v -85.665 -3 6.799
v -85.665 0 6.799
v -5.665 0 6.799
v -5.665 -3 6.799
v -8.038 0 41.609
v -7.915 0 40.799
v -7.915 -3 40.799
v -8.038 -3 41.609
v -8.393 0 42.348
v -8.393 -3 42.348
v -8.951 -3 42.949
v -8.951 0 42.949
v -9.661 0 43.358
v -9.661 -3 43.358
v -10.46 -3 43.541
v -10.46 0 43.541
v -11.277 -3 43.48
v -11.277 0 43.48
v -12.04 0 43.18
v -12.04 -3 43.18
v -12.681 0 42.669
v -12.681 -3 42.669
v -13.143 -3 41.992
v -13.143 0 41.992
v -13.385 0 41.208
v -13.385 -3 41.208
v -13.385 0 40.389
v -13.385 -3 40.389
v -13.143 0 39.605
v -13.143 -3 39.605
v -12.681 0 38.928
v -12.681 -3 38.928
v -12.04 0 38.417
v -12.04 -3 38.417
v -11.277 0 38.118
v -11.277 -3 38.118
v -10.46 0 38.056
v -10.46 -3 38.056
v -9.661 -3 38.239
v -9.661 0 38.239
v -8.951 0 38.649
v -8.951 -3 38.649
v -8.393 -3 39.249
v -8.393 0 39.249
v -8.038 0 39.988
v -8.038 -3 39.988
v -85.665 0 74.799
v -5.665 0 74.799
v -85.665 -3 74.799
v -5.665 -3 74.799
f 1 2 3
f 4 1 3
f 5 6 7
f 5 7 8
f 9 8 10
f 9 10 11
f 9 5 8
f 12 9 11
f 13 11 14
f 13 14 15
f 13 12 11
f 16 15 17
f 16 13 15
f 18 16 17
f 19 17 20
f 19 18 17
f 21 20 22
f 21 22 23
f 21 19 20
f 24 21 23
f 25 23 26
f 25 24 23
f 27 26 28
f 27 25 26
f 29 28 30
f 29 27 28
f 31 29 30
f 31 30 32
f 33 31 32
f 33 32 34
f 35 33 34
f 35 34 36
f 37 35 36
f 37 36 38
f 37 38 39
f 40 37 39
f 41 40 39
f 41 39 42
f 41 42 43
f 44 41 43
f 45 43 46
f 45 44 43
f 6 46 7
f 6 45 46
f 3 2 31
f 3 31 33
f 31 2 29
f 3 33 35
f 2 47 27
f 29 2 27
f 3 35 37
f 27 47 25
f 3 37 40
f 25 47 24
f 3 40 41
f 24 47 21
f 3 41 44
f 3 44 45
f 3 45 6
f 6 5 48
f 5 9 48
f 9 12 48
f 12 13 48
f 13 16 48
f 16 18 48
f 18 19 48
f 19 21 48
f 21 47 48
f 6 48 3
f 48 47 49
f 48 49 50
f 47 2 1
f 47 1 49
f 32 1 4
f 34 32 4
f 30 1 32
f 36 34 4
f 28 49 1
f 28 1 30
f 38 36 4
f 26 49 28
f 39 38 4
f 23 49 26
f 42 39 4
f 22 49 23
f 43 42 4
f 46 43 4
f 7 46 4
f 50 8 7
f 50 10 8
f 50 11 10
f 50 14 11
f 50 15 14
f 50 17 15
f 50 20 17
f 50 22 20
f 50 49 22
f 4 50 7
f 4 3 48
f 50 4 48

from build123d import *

# Parameters (mm, degrees)
F0_W     = 80
F0_H     = 68
F0_R     = 2.75
F1_DEPTH = 3
F3_ANGLE = 180


with BuildPart() as f1:
    # F0 (on Front) → F1 (new body)
    with BuildSketch(Plane.XZ):
        with Locations((-45.665469, 40.798562)):
            Rectangle(F0_W, F0_H)
        with Locations((-10.665469, 40.798562)):
            Circle(F0_R, mode=Mode.SUBTRACT)
    extrude(amount=F1_DEPTH)


with BuildPart() as f3_1:
    # F3: copy of F1
    add(f1.part.rotate(Axis((-5.665469, -1.5, 40.798562), (0, 1, 0)), F3_ANGLE))


solid = f1.part
